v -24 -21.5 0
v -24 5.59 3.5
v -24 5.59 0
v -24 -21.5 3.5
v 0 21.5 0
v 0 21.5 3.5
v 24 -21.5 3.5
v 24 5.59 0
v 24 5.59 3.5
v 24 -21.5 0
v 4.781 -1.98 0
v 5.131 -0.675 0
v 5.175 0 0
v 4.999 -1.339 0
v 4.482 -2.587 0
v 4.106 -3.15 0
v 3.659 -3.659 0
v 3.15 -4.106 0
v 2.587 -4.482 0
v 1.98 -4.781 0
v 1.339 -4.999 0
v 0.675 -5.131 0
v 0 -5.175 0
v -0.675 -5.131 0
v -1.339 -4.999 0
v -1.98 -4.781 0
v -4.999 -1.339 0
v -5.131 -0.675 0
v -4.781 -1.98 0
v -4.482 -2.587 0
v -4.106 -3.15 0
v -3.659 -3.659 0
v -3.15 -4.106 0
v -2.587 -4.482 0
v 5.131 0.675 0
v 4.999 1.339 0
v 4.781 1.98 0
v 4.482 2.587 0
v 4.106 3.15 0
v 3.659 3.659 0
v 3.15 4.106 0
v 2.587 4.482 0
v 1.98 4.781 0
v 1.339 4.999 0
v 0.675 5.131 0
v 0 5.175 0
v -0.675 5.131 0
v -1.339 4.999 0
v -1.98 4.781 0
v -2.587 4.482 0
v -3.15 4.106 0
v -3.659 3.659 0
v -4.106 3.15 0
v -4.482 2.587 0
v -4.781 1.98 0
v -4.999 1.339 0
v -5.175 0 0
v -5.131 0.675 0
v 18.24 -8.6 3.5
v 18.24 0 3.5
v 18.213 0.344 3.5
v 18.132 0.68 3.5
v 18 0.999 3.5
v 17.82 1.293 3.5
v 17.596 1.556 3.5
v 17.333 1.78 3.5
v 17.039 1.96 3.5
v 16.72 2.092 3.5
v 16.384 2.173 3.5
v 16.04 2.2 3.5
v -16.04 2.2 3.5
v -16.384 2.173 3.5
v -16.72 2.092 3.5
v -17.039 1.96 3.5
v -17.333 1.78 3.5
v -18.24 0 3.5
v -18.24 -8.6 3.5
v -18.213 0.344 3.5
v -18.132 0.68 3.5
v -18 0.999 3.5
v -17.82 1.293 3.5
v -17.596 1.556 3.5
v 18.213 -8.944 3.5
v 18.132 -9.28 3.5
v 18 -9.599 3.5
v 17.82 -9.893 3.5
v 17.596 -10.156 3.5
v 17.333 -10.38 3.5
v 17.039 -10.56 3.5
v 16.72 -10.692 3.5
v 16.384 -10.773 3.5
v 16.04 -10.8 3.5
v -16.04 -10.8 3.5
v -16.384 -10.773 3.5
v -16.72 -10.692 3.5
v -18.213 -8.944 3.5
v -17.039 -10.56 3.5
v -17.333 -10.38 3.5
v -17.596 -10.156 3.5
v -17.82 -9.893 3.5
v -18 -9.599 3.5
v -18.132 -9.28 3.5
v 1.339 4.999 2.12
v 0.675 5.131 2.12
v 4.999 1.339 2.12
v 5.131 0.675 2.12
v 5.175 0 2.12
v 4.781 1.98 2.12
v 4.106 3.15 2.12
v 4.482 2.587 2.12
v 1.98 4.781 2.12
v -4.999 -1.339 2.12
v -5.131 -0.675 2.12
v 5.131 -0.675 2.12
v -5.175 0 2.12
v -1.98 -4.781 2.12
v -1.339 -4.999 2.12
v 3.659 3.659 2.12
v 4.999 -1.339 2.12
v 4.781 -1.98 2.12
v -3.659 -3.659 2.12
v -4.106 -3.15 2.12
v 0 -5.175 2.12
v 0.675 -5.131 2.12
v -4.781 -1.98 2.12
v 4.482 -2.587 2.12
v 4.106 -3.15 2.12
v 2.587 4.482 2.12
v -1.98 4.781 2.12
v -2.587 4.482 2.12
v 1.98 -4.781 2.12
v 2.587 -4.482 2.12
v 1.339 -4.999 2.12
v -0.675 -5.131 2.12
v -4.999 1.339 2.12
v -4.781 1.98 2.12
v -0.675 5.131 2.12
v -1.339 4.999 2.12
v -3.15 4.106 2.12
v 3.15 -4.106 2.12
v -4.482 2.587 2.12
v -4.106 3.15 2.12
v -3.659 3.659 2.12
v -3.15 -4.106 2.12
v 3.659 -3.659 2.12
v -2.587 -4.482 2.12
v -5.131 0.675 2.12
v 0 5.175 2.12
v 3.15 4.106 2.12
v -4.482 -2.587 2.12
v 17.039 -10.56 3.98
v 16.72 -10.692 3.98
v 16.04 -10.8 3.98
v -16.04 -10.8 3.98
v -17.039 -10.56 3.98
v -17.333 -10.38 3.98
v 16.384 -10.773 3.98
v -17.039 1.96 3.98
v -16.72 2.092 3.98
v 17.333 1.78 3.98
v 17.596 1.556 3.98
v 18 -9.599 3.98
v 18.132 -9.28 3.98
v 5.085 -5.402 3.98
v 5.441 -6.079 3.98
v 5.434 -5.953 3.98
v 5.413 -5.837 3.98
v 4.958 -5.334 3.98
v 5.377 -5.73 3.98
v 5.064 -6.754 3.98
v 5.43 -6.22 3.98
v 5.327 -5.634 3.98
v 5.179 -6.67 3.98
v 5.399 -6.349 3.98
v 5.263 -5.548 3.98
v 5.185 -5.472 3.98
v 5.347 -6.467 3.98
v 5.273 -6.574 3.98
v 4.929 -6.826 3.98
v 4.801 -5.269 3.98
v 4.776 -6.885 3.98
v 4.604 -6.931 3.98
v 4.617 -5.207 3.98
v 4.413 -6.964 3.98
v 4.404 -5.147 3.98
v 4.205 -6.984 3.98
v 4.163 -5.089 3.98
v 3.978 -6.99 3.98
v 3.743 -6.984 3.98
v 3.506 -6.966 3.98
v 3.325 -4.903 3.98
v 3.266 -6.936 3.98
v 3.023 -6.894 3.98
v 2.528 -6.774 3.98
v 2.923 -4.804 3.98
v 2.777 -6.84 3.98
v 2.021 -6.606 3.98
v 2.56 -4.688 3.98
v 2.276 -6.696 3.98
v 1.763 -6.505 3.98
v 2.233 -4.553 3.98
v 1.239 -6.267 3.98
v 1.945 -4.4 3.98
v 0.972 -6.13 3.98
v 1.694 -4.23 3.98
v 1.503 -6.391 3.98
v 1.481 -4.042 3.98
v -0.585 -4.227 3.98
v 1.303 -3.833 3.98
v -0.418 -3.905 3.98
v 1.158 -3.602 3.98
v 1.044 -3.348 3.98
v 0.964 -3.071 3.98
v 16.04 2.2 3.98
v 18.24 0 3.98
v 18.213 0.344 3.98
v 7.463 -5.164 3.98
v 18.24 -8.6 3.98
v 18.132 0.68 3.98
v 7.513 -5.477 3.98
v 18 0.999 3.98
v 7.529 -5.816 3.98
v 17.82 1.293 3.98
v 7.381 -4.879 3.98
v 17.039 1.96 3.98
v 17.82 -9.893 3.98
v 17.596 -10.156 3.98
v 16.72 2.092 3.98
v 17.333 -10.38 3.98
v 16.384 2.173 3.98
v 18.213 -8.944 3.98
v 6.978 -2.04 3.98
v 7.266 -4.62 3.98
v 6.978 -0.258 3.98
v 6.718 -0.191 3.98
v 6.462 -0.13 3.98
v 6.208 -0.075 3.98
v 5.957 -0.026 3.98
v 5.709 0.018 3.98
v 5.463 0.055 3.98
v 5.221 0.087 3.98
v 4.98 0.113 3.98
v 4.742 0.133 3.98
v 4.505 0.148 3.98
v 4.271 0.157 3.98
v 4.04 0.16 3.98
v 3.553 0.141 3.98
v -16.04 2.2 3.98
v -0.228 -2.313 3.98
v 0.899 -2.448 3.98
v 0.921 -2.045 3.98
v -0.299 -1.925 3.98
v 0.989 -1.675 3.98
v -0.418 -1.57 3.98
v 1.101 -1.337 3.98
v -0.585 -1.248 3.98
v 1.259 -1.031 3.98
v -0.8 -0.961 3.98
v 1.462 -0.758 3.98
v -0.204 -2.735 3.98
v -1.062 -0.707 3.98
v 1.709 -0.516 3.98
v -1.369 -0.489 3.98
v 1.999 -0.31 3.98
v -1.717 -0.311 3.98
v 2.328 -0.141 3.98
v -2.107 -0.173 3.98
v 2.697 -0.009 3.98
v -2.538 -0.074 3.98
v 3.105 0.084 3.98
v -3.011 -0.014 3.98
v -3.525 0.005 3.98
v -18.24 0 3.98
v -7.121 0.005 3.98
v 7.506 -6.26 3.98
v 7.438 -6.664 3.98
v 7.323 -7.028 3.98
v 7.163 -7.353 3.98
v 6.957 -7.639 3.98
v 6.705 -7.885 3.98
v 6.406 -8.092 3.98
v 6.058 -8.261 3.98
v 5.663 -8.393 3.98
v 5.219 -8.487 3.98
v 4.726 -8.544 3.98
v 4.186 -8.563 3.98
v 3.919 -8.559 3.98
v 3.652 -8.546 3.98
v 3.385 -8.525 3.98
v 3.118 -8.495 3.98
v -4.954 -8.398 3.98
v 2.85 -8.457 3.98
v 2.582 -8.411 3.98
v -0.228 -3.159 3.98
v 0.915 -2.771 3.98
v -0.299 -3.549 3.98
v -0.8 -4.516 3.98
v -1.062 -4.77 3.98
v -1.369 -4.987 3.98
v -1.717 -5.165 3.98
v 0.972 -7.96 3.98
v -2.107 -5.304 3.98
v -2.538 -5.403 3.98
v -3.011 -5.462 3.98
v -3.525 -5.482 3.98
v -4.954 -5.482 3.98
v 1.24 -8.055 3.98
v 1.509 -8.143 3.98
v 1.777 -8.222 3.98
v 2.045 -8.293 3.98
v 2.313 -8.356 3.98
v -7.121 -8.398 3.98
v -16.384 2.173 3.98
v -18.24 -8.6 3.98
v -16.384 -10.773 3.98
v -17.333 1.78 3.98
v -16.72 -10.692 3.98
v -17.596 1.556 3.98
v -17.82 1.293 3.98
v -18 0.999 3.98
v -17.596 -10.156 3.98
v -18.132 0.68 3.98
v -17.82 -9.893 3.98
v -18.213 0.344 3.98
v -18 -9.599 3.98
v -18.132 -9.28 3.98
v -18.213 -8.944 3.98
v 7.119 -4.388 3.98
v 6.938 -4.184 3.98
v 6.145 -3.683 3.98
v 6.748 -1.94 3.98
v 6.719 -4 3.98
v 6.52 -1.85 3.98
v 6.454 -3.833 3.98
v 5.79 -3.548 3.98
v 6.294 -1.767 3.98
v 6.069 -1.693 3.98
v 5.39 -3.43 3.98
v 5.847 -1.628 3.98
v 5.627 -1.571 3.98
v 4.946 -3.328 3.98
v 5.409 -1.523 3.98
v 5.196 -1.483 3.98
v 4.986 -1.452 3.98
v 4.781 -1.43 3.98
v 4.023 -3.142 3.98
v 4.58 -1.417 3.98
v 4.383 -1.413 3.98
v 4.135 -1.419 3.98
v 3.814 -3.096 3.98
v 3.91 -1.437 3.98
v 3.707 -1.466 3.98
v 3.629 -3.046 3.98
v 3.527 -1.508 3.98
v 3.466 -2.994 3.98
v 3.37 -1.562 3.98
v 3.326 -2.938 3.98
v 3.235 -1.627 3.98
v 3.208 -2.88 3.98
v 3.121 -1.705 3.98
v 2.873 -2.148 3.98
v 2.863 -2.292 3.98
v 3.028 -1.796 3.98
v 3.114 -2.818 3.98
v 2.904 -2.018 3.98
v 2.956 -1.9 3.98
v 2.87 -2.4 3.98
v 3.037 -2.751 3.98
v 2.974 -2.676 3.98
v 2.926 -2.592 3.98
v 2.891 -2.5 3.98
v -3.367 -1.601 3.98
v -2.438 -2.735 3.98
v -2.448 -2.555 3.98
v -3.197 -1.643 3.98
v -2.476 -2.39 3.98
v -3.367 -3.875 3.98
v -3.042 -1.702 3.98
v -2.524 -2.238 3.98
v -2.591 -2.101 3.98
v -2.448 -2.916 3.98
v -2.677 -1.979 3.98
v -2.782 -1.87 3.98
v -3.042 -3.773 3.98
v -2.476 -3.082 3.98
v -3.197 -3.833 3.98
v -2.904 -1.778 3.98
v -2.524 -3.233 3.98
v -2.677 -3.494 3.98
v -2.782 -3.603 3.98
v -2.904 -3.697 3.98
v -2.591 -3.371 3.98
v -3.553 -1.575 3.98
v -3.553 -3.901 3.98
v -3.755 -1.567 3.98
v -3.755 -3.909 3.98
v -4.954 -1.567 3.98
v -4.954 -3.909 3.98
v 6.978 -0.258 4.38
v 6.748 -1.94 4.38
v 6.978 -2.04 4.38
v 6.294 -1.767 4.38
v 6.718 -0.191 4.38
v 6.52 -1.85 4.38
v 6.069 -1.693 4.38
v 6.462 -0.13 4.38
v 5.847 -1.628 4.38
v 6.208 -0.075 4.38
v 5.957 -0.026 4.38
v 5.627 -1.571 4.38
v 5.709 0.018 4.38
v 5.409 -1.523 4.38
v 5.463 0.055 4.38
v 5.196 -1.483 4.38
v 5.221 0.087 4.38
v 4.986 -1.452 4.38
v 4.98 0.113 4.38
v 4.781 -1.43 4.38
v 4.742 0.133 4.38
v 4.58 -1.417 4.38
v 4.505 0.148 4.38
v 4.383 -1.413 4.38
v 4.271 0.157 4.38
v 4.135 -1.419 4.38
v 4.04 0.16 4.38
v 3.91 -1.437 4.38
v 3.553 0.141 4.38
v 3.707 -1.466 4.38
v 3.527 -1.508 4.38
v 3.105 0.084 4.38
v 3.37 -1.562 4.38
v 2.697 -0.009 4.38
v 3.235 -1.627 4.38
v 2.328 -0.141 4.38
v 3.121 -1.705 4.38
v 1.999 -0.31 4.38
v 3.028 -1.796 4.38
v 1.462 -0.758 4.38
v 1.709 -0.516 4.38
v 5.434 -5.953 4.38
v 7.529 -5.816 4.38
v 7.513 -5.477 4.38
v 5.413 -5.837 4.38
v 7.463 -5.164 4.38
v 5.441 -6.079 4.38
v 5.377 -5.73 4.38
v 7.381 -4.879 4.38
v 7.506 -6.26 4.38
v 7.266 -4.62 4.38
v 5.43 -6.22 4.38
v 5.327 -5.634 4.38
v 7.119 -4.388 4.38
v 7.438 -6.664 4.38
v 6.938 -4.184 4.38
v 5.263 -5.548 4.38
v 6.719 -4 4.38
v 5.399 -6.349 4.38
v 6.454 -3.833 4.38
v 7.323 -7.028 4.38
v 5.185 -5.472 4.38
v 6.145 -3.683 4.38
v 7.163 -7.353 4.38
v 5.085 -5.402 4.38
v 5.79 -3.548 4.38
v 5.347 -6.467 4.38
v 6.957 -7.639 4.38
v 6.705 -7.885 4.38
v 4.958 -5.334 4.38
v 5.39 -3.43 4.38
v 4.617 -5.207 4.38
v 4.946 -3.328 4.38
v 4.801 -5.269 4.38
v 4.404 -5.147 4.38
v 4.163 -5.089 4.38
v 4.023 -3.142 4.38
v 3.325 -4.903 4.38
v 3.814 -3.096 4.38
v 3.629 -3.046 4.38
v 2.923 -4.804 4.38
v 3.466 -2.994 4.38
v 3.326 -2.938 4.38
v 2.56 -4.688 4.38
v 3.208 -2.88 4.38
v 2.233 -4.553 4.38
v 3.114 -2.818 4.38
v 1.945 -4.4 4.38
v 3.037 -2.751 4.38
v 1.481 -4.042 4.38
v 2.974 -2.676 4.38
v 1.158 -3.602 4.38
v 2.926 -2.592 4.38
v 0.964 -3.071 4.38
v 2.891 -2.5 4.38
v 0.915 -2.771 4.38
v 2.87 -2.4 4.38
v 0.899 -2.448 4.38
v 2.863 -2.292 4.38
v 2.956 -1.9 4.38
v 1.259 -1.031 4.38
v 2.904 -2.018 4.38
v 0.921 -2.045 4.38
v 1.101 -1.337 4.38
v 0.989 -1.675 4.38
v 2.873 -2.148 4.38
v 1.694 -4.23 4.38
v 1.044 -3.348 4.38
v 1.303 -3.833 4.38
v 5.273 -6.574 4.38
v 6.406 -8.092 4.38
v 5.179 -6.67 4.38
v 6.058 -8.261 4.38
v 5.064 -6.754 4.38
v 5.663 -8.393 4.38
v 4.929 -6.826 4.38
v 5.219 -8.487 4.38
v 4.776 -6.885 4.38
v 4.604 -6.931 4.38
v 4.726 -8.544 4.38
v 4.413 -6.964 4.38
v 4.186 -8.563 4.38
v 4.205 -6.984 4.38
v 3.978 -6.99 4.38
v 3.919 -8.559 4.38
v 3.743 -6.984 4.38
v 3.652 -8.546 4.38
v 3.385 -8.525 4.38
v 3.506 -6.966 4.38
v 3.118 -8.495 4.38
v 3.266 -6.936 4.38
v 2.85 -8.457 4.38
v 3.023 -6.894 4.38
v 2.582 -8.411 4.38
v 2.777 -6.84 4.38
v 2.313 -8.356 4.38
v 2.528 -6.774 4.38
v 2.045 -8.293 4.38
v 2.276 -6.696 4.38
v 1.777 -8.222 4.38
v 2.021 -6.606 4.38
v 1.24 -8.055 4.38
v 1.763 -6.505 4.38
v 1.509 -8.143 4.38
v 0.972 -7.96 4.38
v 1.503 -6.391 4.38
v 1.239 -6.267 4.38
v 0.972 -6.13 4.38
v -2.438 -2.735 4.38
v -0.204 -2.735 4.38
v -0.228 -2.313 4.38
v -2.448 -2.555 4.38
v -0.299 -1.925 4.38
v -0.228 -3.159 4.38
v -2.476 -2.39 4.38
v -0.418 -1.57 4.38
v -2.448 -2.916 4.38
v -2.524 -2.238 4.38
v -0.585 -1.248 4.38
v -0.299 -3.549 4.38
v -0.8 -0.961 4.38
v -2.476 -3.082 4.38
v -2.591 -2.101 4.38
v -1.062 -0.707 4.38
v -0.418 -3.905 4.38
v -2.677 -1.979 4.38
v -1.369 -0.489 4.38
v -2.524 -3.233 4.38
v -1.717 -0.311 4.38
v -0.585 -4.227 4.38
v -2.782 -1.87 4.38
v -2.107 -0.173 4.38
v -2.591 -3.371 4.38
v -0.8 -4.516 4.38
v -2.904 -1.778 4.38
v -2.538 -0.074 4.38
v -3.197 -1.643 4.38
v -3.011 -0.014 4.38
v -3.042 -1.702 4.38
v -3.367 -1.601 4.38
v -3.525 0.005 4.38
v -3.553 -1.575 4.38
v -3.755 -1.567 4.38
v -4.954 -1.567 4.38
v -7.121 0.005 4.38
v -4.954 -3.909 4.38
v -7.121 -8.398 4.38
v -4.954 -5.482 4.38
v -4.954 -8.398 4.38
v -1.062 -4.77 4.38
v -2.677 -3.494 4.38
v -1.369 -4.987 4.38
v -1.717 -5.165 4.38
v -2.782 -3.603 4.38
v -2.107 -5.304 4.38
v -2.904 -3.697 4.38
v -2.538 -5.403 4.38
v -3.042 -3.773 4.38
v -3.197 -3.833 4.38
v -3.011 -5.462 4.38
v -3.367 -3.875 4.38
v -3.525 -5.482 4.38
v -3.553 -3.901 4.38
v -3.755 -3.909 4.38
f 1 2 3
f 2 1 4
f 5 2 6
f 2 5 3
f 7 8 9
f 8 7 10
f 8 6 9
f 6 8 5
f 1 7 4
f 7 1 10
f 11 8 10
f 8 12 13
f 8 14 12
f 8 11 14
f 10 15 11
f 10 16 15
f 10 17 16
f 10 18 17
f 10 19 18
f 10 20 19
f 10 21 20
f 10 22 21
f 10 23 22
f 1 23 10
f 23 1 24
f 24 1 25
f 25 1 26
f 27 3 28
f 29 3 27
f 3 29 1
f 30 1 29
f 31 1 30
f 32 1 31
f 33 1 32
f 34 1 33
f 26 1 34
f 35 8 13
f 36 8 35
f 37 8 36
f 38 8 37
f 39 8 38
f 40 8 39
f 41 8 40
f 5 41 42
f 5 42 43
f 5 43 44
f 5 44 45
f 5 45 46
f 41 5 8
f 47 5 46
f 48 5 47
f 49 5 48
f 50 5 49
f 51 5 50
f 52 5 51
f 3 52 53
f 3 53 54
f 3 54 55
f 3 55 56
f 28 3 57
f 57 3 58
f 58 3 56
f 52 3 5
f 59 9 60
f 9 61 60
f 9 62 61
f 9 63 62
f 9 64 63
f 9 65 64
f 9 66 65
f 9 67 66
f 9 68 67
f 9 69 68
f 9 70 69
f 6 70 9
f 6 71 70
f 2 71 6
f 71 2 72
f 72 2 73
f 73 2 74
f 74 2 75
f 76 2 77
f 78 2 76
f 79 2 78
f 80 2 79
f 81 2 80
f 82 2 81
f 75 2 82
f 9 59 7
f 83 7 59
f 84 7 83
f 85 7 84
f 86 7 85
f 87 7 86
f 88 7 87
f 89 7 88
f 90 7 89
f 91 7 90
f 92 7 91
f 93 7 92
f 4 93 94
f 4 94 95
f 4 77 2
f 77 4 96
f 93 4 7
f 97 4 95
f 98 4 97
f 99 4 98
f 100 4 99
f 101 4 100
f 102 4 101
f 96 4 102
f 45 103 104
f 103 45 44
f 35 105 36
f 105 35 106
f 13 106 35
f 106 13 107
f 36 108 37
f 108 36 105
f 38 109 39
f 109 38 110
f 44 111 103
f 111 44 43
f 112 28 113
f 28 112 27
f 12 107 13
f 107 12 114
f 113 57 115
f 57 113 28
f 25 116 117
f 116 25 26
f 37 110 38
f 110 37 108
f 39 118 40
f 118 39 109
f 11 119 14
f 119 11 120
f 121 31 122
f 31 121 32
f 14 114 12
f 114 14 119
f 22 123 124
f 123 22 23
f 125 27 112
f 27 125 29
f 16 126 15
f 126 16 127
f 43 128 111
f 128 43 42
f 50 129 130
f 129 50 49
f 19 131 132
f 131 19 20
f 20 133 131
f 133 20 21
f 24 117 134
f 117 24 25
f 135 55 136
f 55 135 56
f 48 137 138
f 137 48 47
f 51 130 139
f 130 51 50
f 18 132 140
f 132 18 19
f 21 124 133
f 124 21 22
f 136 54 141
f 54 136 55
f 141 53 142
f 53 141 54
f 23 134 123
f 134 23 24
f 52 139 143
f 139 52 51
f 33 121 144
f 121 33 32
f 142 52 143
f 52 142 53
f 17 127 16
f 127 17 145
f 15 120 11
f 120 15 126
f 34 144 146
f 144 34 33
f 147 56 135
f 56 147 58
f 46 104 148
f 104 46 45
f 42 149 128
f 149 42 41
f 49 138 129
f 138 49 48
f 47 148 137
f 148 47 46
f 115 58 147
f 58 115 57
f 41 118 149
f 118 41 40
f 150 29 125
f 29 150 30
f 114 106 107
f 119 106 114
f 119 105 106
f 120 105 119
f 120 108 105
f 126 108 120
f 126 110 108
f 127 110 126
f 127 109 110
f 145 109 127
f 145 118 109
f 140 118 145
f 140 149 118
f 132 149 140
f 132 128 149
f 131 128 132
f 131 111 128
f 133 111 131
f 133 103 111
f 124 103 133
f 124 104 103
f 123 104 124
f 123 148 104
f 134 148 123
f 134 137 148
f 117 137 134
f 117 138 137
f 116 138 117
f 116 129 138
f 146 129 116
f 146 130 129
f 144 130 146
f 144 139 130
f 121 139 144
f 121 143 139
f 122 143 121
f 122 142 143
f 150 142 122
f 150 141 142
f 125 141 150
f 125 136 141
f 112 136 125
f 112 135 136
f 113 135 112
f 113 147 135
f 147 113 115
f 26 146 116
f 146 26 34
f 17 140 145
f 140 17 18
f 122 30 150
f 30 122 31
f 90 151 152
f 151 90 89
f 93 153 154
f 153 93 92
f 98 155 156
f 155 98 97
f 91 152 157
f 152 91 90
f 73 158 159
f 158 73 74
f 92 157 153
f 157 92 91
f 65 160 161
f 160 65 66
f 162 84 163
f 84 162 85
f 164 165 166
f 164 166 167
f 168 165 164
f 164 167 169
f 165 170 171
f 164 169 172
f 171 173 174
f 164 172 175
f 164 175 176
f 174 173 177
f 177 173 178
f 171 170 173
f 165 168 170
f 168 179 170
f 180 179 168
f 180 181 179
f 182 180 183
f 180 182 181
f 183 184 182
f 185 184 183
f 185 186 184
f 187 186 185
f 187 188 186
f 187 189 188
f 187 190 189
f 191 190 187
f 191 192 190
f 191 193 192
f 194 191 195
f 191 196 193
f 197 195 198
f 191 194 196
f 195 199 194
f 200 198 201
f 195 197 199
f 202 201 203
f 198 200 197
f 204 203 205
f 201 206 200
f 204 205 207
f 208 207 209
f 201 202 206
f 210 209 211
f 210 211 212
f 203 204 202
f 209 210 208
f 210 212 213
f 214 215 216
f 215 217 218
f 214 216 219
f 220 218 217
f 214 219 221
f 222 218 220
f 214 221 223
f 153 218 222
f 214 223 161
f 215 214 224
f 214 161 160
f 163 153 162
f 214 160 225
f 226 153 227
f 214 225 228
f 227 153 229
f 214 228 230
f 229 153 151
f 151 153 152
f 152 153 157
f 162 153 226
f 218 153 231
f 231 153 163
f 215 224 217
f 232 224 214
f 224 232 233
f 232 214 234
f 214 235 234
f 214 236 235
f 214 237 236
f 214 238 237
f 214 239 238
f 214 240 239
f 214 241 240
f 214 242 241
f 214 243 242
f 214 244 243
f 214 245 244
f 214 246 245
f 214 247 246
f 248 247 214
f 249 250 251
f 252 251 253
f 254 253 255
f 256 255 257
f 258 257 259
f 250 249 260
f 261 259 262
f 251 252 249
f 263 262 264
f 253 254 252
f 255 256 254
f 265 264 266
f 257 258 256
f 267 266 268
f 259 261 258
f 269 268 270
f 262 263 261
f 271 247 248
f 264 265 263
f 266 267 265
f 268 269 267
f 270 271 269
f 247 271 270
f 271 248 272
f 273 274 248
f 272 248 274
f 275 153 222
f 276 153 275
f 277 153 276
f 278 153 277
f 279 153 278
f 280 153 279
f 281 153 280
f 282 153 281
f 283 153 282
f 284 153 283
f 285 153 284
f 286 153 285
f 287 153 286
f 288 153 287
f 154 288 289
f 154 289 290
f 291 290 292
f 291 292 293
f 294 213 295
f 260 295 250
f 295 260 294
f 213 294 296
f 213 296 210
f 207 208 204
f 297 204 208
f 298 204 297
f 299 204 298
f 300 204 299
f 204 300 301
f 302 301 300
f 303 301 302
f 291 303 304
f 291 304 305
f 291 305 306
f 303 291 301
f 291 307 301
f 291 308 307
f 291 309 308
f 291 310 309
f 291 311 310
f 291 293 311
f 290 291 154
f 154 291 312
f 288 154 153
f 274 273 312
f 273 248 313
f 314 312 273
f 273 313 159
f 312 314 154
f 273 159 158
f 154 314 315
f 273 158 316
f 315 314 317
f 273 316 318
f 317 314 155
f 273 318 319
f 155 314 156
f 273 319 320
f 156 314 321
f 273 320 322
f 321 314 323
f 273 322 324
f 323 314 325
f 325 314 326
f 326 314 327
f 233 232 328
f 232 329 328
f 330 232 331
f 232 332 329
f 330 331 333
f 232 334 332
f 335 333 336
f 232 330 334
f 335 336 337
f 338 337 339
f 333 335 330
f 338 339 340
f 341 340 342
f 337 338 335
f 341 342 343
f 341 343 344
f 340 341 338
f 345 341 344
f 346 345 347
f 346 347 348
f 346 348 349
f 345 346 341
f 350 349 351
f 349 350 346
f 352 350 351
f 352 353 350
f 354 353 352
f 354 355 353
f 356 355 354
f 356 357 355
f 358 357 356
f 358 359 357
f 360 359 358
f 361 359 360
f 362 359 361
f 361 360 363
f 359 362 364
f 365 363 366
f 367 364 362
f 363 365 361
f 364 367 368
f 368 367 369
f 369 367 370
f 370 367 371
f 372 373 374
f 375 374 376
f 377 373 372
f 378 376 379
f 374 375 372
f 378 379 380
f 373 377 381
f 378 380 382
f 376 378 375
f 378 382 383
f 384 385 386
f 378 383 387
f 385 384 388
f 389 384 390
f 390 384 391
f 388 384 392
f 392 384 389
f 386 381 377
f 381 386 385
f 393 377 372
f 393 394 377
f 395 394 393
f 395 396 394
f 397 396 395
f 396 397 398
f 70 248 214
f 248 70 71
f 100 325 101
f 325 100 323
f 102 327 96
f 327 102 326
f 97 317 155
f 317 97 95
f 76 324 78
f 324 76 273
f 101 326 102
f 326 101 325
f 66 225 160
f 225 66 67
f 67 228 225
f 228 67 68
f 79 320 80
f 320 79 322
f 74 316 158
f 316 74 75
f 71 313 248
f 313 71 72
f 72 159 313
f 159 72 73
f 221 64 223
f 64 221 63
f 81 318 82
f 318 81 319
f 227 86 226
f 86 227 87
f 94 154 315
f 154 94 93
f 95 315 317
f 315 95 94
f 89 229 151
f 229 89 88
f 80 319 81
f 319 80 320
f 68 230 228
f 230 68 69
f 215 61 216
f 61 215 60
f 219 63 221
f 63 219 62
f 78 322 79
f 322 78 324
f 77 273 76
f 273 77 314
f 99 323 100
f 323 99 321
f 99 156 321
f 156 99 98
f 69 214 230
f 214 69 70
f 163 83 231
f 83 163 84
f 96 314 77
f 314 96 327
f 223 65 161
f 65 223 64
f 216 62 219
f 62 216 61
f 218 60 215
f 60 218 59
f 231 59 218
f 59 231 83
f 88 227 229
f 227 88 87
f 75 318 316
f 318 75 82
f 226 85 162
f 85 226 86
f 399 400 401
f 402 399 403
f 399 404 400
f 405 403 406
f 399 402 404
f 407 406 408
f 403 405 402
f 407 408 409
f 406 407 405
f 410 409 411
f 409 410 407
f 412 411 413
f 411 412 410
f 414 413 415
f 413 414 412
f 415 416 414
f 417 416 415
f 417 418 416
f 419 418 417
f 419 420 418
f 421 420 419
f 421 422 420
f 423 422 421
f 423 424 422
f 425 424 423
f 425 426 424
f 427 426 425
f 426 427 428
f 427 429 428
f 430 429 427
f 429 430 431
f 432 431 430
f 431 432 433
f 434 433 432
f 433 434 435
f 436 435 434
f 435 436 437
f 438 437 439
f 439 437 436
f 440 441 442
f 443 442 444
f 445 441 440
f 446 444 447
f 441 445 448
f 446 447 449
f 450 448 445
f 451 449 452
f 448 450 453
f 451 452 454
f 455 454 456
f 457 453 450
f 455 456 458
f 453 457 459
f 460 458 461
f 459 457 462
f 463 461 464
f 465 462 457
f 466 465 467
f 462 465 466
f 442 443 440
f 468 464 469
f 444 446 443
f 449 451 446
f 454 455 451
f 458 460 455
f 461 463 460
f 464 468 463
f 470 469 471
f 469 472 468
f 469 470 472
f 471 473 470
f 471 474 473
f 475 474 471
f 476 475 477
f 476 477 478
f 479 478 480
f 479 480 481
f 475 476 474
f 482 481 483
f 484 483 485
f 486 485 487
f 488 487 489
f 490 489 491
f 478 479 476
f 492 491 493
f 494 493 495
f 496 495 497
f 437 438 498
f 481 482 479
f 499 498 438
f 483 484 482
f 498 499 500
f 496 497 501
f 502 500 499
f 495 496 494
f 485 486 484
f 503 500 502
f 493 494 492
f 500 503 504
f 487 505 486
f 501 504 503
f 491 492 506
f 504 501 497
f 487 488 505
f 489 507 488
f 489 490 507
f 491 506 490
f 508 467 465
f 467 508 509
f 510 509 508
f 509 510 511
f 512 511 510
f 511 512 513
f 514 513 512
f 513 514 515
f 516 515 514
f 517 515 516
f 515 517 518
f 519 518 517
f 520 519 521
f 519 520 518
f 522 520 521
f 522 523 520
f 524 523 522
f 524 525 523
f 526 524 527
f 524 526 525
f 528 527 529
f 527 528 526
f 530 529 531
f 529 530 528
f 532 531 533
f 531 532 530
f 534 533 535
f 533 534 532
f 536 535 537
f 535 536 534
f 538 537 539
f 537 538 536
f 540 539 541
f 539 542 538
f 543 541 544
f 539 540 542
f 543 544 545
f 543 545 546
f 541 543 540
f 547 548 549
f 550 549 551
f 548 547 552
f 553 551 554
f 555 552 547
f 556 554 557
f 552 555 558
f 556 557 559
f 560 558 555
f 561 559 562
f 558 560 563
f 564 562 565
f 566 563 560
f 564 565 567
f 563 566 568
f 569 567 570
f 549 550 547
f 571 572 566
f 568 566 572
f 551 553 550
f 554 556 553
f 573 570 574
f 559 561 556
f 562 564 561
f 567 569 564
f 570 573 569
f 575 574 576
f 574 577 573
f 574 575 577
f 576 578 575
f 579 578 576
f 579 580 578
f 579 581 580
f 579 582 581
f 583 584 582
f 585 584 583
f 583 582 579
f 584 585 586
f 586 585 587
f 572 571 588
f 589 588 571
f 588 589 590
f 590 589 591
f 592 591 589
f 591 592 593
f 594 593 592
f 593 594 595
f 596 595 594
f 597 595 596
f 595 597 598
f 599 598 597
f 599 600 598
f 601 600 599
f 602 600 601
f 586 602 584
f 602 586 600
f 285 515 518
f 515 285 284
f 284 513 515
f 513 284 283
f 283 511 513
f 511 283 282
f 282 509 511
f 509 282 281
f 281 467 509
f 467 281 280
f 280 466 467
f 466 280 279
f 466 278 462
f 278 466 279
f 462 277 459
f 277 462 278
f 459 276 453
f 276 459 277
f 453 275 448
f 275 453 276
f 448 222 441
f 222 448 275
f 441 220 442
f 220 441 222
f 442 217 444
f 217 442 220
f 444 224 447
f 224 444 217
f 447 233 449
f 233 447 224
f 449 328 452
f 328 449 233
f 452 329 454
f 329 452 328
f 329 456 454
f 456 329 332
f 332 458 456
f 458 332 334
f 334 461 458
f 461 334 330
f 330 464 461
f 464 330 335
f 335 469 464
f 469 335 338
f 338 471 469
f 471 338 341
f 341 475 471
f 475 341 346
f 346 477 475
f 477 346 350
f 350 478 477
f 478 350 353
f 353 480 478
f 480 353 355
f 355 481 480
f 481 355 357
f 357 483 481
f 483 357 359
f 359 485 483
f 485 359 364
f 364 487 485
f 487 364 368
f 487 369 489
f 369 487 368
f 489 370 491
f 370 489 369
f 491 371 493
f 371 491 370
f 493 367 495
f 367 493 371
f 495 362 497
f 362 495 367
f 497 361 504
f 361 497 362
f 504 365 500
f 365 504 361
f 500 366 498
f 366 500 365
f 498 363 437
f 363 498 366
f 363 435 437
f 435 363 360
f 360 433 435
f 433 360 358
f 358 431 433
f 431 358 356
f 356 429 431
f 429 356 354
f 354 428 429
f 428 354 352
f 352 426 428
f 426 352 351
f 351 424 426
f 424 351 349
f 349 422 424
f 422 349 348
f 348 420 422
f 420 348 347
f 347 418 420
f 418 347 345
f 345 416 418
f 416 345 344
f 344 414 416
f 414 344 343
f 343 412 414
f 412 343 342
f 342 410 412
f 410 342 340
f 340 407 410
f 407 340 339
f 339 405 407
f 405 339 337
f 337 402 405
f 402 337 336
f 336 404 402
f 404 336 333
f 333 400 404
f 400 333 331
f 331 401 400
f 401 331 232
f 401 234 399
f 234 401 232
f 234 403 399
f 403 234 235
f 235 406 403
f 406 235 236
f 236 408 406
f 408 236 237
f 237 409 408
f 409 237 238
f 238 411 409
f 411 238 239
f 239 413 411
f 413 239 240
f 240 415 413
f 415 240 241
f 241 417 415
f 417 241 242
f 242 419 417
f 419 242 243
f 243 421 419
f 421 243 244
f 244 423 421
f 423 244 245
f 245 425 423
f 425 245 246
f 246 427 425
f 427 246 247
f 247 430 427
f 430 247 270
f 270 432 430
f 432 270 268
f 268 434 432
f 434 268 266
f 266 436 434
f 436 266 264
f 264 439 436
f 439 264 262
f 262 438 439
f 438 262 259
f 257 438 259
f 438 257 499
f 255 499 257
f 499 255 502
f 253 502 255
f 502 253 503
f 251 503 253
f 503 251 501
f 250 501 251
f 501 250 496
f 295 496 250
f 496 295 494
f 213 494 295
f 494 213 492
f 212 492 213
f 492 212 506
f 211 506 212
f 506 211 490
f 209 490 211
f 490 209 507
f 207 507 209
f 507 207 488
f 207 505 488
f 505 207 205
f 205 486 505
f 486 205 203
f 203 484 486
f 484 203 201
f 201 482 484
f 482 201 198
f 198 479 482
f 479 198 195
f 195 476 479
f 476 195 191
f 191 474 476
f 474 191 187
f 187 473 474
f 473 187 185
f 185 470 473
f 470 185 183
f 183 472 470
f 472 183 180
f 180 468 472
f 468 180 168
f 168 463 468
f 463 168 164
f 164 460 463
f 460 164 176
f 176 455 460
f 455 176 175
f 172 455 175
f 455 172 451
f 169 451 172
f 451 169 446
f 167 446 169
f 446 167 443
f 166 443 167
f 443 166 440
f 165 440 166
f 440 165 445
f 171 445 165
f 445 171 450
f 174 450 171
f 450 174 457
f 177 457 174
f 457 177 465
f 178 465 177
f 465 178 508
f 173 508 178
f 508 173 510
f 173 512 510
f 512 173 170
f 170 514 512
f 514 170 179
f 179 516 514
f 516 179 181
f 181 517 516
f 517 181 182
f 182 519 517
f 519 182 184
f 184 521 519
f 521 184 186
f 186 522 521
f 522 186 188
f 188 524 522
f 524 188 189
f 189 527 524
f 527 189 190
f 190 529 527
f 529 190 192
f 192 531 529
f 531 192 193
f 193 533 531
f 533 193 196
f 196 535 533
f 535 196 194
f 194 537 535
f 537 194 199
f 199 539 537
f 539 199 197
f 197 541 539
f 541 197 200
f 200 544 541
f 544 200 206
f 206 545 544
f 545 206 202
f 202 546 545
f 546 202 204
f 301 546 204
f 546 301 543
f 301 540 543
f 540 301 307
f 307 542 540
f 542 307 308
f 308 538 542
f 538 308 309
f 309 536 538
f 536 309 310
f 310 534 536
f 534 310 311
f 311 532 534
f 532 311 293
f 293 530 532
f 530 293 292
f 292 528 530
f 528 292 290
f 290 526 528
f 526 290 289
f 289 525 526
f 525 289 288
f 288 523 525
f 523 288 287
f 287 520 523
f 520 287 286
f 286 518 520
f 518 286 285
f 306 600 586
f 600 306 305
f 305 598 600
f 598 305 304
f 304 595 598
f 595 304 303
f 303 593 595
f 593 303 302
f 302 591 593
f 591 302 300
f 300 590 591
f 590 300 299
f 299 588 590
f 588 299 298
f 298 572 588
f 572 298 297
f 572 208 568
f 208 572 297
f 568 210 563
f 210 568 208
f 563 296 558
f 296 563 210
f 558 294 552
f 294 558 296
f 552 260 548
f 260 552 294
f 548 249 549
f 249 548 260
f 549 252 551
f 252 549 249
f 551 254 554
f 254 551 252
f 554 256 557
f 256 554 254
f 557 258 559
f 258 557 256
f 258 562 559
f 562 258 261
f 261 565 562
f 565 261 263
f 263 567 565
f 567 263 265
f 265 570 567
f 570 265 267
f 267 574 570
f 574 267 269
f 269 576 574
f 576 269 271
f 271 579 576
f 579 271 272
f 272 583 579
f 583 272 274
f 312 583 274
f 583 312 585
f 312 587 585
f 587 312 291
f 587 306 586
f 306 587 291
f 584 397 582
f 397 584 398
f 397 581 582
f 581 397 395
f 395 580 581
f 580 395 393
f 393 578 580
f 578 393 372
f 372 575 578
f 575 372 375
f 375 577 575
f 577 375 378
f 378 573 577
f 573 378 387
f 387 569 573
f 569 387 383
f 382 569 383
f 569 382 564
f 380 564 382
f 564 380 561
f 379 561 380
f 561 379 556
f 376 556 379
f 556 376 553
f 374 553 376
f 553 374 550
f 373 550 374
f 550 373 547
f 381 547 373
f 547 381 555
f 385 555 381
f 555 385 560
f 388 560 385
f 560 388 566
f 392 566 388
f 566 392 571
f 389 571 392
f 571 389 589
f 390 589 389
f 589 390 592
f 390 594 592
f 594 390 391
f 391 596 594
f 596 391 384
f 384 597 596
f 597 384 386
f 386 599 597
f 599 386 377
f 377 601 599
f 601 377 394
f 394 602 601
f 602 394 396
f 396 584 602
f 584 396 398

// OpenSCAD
// POLSOLIDE — Minimagnes „Domek”
// Materiały: base=czarny (#18181B); red=czerwony (#B7131C); white=biały (#F1F0EC).
// Zapisz do STL: openscad -o element.stl -D 'part="base"' tenplik.scad
// Model na płasko: wszystkie barwy zmieniają się tylko na samym końcu druku.
$fn=40;
part="all"; // all, base, red, white
W=48; H=43; T=3.5; kind="house";
RH=0.48; WH=0.40; // wysokość czerwonego i białego detalowania
magnet=true;
label=""; // zmień np. numer lokalu, oznaczenie stanowiska lub pomieszczenia

module rr(w,h,r){offset(r=r) square([max(0.1,w-2*r),max(0.1,h-2*r)],center=true);}
module outline(){
 if(kind=="house")polygon(points=[[-W/2,-H/2],[W/2,-H/2],[W/2,H*.13],[0,H/2],[-W/2,H*.13]]);
 else if(kind=="shield")polygon(points=[[-W*.46,H*.48],[W*.46,H*.48],[W*.49,-H*.05],[W*.25,-H*.32],[0,-H*.49],[-W*.25,-H*.32],[-W*.49,-H*.05]]);
 else if(kind=="hex")polygon(points=[[-W*.35,-H/2],[W*.35,-H/2],[W/2,0],[W*.35,H/2],[-W*.35,H/2],[-W/2,0]]);
 else if(kind=="oval")scale([W/2,H/2])circle(r=1,$fn=60);
 else if(kind=="coin")circle(d=W,$fn=72);
 else if(kind=="plaque")rr(W,H,3.0);
 else if(kind=="luggage")rr(W,H,6.5);
 else if(kind=="arch")union(){translate([0,-H*.10])rr(W,H*.8,5);translate([0,H*.14])scale([W/2,H*.37])circle(r=1,$fn=48);}
 else if(kind=="key") union(){translate([-W*.3,0])circle(d=H,$fn=48);translate([W*.08,-H*.16])square([W*.68,H*.32],center=true);translate([W*.31,-H*.27])square([W*.11,H*.20],center=true);translate([W*.42,-H*.27])square([W*.09,H*.20],center=true);}
 else if(kind=="tag")union(){rr(W-7,H,5);translate([-W/2+5,0])circle(d=H*.78,$fn=48);}
 else rr(W,H,5);
}
module hole2d(){
 if(kind=="house")translate([0,H*.29])circle(d=4.6,$fn=40);
 else if(kind=="shield")translate([0,H*.34])circle(d=4.6,$fn=40);
 else if(kind=="key")translate([-W*.3,0])circle(d=4.6,$fn=40);
 else if(kind=="oval" && !magnet)translate([-W*.34,0])circle(d=4.6,$fn=40);
 else if(kind=="tag")translate([-W*.36,0])circle(d=4.6,$fn=40);
 else if(kind=="luggage")translate([-W*.40,0])circle(d=5,$fn=40);
}
module footprint(){difference(){outline(); if(!magnet)hole2d();}}
// W małych produktach monogram PS jest większy i czytelniejszy przy dyszy 0.4 mm.
small=(W<=50 || kind=="coin" || kind=="hex");
bw= min(W*.76,64);
bh=(label=="")?(small?13:15):20;
// dla breloka w kształcie klucza środek znaku przesunięto od oczka
badgeX=(kind=="key")?W*.13:(kind=="oval"&&!magnet?W*.055:(kind=="tag"?W*.07:(kind=="luggage"?W*.03:0)));
badgeY=(kind=="house" || kind=="shield")?-H*.10:0;
module brand_patch(){translate([badgeX,badgeY])rr(bw,bh,2.2);}
module base_black(){difference(){linear_extrude(height=T,convexity=8)footprint();
 if(magnet)translate([0,0,-0.02])cylinder(h=2.14,d=10.35,$fn=48);
}}
module red_cap(){translate([0,0,T])linear_extrude(height=RH)intersection(){offset(delta=-.55)footprint();brand_patch();}}
module white_brand(){
 translate([badgeX,badgeY,T+RH])linear_extrude(height=WH)
 if(label!="") {
   translate([0,3.8])text("POLSOLIDE",font="DejaVu Sans:style=Bold",size=min(4.0,bw*.087),halign="center",valign="center");
   translate([0,-4.0])text(label,font="DejaVu Sans:style=Bold",size=min(6.4,bw/(max(2,len(label))*0.75)),halign="center",valign="center");
 }
 else if(small) text("PS",font="DejaVu Sans:style=Bold",size=8.3,halign="center",valign="center");
 else text("POLSOLIDE",font="DejaVu Sans:style=Bold",size=min(6.4,bw*.127),halign="center",valign="center");
}
if(part=="all"||part=="base")color([.094,.094,.106])base_black();
if(part=="all"||part=="red")color([.718,.075,.11])red_cap();
if(part=="all"||part=="white")color([.945,.941,.925])white_brand();
